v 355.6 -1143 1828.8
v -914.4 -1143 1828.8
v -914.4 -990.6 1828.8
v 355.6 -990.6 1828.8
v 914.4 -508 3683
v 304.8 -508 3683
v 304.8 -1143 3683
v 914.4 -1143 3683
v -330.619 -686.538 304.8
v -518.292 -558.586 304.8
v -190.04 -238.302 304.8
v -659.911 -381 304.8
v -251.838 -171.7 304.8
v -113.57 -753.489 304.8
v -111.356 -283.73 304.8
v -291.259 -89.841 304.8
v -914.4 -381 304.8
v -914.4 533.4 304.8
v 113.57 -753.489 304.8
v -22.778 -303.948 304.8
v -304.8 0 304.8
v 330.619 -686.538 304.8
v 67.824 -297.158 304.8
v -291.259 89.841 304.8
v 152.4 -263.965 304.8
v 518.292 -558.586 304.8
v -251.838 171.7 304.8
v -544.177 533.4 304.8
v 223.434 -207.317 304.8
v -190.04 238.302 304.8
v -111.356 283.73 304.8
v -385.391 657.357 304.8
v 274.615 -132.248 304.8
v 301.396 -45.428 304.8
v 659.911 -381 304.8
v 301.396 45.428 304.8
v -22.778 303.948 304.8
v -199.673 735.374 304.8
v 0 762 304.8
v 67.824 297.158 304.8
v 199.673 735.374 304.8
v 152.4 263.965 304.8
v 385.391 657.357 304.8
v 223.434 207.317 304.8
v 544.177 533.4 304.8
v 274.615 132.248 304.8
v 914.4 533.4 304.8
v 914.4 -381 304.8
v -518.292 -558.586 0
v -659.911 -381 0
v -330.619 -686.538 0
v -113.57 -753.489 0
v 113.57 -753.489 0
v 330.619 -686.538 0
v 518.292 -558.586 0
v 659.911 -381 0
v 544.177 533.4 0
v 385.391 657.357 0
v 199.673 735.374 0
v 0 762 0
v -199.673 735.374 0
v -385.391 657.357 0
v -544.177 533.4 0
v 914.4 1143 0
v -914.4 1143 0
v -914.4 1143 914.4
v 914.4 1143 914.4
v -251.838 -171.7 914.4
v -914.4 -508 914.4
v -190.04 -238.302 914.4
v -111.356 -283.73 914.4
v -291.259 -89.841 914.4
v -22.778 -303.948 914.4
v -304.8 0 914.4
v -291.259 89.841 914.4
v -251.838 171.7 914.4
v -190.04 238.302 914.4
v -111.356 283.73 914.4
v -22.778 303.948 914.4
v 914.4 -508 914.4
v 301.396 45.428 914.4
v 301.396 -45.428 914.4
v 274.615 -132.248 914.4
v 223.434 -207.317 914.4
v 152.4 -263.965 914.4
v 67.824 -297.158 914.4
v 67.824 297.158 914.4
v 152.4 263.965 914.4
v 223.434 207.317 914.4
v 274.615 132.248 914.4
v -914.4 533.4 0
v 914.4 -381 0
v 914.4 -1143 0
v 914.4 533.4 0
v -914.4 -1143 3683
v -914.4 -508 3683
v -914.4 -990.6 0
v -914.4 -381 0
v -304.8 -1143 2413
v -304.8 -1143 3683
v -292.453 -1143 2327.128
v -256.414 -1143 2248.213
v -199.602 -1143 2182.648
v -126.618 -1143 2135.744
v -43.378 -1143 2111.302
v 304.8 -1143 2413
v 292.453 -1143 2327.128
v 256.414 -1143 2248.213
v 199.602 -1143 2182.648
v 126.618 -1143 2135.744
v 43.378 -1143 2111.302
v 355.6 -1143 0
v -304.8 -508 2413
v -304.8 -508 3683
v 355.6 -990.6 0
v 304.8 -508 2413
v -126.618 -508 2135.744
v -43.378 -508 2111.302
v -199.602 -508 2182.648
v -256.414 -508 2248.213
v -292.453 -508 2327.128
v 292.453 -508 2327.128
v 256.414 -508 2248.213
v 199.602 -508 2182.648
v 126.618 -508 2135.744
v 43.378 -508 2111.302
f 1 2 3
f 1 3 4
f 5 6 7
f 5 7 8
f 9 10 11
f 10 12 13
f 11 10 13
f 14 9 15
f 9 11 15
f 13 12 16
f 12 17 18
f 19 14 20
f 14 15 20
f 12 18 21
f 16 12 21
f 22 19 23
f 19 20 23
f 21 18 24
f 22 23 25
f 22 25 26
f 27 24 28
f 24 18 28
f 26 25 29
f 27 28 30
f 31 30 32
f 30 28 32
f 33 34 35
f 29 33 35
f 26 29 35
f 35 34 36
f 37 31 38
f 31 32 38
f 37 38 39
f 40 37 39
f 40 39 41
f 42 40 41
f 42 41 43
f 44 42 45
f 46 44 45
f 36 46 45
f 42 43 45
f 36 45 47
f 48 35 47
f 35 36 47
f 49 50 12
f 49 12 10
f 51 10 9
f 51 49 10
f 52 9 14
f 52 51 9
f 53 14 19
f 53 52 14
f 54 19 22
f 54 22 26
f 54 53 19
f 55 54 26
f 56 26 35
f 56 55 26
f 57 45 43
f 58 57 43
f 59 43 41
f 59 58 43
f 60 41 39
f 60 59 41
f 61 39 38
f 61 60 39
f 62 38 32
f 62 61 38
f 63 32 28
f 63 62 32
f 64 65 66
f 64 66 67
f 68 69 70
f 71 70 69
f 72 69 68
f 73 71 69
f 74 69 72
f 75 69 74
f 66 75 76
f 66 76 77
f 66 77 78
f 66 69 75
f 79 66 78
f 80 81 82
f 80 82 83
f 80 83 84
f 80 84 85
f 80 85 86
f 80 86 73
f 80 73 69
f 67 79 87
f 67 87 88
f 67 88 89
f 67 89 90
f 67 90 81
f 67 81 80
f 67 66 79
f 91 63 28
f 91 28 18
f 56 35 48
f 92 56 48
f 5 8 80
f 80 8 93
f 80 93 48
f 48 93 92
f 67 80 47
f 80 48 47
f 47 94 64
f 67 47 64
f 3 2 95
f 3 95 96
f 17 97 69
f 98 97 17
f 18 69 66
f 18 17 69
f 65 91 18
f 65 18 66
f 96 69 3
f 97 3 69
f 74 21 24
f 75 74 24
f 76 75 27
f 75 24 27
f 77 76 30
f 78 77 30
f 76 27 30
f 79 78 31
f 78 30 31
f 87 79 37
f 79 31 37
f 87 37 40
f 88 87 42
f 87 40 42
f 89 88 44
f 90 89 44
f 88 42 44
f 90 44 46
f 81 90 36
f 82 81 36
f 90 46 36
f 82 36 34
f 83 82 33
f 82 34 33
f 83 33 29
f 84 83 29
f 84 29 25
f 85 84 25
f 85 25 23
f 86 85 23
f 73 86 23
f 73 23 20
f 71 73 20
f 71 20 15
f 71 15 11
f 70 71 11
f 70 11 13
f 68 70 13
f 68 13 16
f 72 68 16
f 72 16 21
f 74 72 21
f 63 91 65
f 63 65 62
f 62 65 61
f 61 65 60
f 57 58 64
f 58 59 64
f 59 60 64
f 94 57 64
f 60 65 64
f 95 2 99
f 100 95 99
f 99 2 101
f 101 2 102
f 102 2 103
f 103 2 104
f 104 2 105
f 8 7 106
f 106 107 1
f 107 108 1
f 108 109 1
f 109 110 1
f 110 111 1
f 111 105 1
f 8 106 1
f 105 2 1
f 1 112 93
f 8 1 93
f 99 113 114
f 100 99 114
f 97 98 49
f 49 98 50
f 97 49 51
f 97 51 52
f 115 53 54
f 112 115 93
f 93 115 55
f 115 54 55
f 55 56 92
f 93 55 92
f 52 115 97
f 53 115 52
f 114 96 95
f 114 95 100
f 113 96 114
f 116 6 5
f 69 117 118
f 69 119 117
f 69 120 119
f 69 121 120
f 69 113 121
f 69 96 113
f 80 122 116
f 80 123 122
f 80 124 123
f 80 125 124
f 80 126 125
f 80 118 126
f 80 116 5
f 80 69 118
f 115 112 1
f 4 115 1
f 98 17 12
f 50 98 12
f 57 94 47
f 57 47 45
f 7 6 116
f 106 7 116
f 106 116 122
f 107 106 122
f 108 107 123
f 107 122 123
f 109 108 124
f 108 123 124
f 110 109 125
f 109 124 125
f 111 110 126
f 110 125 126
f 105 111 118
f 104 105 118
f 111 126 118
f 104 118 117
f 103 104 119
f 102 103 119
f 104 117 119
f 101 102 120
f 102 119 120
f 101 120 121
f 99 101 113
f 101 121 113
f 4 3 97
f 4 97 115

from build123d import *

# Parameters (mm, degrees)
SKETCH1_W           = 1828.8
SKETCH1_H           = 2286
BOSS_EXTRUDE1_DEPTH = 914.4
SKETCH2_W           = 1828.8
SKETCH2_H           = 635
BOSS_EXTRUDE2_DEPTH = 2768.6
CUT_EXTRUDE1_DEPTH  = 4139.407587466
SKETCH4_W           = 1270
SKETCH4_H           = 1828.8
CUT_EXTRUDE2_DEPTH  = 152.4
CUT_EXTRUDE3_DEPTH  = 304.8
SKETCH6_R           = 304.8
CUT_EXTRUDE4_DEPTH  = 3682.685972486


with BuildPart() as part:
    # Sketch1 → Boss-Extrude1 (new body)
    with BuildSketch(Plane.XY):
        Rectangle(SKETCH1_W, SKETCH1_H)
    extrude(amount=BOSS_EXTRUDE1_DEPTH)

    # Sketch2 → Boss-Extrude2 (add)
    with BuildSketch(Plane.XY.offset(914.4)):
        with Locations((0, -825.5)):
            Rectangle(SKETCH2_W, SKETCH2_H)
    extrude(amount=BOSS_EXTRUDE2_DEPTH)

    # Sketch3 → Cut-Extrude1 (cut, through all)
    with BuildSketch(Plane(origin=(0, -508, 0), x_dir=(1, 0, 0), z_dir=(0, 1, 0))):
        with BuildLine():
            Line((304.8, -3683), (304.8, -2413))
            ThreePointArc((304.8, -2413), (0, -2108.2), (-304.8, -2413))
            Line((-304.8, -2413), (-304.8, -3683))
            Line((-304.8, -3683), (304.8, -3683))
        make_face()
    extrude(amount=-CUT_EXTRUDE1_DEPTH, mode=Mode.SUBTRACT)

    # Sketch4 → Cut-Extrude2 (cut)
    with BuildSketch(Plane.XZ.offset(1143)):
        with Locations((-279.4, 914.4)):
            Rectangle(SKETCH4_W, SKETCH4_H)
    extrude(amount=-CUT_EXTRUDE2_DEPTH, mode=Mode.SUBTRACT)

    # Sketch5 → Cut-Extrude3 (cut)
    with BuildSketch(Plane(origin=(0, 0, 0), x_dir=(-1, 0, 0), z_dir=(0, 0, -1))):
        with BuildLine():
            Line((-914.4, 533.4), (-544.176846255, 533.4))
            ThreePointArc((-544.176846255, 533.4), (0, 762), (544.176846255, 533.4))
            Line((544.176846255, 533.4), (914.4, 533.4))
            Line((914.4, 533.4), (914.4, -381))
            Line((914.4, -381), (659.911357684, -381))
            ThreePointArc((659.911357684, -381), (0, -762), (-659.911357684, -381))
            Line((-659.911357684, -381), (-914.4, -381))
            Line((-914.4, -381), (-914.4, 533.4))
        make_face()
    extrude(amount=-CUT_EXTRUDE3_DEPTH, mode=Mode.SUBTRACT)

    # Sketch6 → Cut-Extrude4 (cut, through all)
    with BuildSketch(Plane(origin=(0, 0, 304.8), x_dir=(-1, 0, 0), z_dir=(0, 0, -1))):
        Circle(SKETCH6_R)
    extrude(amount=-CUT_EXTRUDE4_DEPTH, mode=Mode.SUBTRACT)


solid = part.part
